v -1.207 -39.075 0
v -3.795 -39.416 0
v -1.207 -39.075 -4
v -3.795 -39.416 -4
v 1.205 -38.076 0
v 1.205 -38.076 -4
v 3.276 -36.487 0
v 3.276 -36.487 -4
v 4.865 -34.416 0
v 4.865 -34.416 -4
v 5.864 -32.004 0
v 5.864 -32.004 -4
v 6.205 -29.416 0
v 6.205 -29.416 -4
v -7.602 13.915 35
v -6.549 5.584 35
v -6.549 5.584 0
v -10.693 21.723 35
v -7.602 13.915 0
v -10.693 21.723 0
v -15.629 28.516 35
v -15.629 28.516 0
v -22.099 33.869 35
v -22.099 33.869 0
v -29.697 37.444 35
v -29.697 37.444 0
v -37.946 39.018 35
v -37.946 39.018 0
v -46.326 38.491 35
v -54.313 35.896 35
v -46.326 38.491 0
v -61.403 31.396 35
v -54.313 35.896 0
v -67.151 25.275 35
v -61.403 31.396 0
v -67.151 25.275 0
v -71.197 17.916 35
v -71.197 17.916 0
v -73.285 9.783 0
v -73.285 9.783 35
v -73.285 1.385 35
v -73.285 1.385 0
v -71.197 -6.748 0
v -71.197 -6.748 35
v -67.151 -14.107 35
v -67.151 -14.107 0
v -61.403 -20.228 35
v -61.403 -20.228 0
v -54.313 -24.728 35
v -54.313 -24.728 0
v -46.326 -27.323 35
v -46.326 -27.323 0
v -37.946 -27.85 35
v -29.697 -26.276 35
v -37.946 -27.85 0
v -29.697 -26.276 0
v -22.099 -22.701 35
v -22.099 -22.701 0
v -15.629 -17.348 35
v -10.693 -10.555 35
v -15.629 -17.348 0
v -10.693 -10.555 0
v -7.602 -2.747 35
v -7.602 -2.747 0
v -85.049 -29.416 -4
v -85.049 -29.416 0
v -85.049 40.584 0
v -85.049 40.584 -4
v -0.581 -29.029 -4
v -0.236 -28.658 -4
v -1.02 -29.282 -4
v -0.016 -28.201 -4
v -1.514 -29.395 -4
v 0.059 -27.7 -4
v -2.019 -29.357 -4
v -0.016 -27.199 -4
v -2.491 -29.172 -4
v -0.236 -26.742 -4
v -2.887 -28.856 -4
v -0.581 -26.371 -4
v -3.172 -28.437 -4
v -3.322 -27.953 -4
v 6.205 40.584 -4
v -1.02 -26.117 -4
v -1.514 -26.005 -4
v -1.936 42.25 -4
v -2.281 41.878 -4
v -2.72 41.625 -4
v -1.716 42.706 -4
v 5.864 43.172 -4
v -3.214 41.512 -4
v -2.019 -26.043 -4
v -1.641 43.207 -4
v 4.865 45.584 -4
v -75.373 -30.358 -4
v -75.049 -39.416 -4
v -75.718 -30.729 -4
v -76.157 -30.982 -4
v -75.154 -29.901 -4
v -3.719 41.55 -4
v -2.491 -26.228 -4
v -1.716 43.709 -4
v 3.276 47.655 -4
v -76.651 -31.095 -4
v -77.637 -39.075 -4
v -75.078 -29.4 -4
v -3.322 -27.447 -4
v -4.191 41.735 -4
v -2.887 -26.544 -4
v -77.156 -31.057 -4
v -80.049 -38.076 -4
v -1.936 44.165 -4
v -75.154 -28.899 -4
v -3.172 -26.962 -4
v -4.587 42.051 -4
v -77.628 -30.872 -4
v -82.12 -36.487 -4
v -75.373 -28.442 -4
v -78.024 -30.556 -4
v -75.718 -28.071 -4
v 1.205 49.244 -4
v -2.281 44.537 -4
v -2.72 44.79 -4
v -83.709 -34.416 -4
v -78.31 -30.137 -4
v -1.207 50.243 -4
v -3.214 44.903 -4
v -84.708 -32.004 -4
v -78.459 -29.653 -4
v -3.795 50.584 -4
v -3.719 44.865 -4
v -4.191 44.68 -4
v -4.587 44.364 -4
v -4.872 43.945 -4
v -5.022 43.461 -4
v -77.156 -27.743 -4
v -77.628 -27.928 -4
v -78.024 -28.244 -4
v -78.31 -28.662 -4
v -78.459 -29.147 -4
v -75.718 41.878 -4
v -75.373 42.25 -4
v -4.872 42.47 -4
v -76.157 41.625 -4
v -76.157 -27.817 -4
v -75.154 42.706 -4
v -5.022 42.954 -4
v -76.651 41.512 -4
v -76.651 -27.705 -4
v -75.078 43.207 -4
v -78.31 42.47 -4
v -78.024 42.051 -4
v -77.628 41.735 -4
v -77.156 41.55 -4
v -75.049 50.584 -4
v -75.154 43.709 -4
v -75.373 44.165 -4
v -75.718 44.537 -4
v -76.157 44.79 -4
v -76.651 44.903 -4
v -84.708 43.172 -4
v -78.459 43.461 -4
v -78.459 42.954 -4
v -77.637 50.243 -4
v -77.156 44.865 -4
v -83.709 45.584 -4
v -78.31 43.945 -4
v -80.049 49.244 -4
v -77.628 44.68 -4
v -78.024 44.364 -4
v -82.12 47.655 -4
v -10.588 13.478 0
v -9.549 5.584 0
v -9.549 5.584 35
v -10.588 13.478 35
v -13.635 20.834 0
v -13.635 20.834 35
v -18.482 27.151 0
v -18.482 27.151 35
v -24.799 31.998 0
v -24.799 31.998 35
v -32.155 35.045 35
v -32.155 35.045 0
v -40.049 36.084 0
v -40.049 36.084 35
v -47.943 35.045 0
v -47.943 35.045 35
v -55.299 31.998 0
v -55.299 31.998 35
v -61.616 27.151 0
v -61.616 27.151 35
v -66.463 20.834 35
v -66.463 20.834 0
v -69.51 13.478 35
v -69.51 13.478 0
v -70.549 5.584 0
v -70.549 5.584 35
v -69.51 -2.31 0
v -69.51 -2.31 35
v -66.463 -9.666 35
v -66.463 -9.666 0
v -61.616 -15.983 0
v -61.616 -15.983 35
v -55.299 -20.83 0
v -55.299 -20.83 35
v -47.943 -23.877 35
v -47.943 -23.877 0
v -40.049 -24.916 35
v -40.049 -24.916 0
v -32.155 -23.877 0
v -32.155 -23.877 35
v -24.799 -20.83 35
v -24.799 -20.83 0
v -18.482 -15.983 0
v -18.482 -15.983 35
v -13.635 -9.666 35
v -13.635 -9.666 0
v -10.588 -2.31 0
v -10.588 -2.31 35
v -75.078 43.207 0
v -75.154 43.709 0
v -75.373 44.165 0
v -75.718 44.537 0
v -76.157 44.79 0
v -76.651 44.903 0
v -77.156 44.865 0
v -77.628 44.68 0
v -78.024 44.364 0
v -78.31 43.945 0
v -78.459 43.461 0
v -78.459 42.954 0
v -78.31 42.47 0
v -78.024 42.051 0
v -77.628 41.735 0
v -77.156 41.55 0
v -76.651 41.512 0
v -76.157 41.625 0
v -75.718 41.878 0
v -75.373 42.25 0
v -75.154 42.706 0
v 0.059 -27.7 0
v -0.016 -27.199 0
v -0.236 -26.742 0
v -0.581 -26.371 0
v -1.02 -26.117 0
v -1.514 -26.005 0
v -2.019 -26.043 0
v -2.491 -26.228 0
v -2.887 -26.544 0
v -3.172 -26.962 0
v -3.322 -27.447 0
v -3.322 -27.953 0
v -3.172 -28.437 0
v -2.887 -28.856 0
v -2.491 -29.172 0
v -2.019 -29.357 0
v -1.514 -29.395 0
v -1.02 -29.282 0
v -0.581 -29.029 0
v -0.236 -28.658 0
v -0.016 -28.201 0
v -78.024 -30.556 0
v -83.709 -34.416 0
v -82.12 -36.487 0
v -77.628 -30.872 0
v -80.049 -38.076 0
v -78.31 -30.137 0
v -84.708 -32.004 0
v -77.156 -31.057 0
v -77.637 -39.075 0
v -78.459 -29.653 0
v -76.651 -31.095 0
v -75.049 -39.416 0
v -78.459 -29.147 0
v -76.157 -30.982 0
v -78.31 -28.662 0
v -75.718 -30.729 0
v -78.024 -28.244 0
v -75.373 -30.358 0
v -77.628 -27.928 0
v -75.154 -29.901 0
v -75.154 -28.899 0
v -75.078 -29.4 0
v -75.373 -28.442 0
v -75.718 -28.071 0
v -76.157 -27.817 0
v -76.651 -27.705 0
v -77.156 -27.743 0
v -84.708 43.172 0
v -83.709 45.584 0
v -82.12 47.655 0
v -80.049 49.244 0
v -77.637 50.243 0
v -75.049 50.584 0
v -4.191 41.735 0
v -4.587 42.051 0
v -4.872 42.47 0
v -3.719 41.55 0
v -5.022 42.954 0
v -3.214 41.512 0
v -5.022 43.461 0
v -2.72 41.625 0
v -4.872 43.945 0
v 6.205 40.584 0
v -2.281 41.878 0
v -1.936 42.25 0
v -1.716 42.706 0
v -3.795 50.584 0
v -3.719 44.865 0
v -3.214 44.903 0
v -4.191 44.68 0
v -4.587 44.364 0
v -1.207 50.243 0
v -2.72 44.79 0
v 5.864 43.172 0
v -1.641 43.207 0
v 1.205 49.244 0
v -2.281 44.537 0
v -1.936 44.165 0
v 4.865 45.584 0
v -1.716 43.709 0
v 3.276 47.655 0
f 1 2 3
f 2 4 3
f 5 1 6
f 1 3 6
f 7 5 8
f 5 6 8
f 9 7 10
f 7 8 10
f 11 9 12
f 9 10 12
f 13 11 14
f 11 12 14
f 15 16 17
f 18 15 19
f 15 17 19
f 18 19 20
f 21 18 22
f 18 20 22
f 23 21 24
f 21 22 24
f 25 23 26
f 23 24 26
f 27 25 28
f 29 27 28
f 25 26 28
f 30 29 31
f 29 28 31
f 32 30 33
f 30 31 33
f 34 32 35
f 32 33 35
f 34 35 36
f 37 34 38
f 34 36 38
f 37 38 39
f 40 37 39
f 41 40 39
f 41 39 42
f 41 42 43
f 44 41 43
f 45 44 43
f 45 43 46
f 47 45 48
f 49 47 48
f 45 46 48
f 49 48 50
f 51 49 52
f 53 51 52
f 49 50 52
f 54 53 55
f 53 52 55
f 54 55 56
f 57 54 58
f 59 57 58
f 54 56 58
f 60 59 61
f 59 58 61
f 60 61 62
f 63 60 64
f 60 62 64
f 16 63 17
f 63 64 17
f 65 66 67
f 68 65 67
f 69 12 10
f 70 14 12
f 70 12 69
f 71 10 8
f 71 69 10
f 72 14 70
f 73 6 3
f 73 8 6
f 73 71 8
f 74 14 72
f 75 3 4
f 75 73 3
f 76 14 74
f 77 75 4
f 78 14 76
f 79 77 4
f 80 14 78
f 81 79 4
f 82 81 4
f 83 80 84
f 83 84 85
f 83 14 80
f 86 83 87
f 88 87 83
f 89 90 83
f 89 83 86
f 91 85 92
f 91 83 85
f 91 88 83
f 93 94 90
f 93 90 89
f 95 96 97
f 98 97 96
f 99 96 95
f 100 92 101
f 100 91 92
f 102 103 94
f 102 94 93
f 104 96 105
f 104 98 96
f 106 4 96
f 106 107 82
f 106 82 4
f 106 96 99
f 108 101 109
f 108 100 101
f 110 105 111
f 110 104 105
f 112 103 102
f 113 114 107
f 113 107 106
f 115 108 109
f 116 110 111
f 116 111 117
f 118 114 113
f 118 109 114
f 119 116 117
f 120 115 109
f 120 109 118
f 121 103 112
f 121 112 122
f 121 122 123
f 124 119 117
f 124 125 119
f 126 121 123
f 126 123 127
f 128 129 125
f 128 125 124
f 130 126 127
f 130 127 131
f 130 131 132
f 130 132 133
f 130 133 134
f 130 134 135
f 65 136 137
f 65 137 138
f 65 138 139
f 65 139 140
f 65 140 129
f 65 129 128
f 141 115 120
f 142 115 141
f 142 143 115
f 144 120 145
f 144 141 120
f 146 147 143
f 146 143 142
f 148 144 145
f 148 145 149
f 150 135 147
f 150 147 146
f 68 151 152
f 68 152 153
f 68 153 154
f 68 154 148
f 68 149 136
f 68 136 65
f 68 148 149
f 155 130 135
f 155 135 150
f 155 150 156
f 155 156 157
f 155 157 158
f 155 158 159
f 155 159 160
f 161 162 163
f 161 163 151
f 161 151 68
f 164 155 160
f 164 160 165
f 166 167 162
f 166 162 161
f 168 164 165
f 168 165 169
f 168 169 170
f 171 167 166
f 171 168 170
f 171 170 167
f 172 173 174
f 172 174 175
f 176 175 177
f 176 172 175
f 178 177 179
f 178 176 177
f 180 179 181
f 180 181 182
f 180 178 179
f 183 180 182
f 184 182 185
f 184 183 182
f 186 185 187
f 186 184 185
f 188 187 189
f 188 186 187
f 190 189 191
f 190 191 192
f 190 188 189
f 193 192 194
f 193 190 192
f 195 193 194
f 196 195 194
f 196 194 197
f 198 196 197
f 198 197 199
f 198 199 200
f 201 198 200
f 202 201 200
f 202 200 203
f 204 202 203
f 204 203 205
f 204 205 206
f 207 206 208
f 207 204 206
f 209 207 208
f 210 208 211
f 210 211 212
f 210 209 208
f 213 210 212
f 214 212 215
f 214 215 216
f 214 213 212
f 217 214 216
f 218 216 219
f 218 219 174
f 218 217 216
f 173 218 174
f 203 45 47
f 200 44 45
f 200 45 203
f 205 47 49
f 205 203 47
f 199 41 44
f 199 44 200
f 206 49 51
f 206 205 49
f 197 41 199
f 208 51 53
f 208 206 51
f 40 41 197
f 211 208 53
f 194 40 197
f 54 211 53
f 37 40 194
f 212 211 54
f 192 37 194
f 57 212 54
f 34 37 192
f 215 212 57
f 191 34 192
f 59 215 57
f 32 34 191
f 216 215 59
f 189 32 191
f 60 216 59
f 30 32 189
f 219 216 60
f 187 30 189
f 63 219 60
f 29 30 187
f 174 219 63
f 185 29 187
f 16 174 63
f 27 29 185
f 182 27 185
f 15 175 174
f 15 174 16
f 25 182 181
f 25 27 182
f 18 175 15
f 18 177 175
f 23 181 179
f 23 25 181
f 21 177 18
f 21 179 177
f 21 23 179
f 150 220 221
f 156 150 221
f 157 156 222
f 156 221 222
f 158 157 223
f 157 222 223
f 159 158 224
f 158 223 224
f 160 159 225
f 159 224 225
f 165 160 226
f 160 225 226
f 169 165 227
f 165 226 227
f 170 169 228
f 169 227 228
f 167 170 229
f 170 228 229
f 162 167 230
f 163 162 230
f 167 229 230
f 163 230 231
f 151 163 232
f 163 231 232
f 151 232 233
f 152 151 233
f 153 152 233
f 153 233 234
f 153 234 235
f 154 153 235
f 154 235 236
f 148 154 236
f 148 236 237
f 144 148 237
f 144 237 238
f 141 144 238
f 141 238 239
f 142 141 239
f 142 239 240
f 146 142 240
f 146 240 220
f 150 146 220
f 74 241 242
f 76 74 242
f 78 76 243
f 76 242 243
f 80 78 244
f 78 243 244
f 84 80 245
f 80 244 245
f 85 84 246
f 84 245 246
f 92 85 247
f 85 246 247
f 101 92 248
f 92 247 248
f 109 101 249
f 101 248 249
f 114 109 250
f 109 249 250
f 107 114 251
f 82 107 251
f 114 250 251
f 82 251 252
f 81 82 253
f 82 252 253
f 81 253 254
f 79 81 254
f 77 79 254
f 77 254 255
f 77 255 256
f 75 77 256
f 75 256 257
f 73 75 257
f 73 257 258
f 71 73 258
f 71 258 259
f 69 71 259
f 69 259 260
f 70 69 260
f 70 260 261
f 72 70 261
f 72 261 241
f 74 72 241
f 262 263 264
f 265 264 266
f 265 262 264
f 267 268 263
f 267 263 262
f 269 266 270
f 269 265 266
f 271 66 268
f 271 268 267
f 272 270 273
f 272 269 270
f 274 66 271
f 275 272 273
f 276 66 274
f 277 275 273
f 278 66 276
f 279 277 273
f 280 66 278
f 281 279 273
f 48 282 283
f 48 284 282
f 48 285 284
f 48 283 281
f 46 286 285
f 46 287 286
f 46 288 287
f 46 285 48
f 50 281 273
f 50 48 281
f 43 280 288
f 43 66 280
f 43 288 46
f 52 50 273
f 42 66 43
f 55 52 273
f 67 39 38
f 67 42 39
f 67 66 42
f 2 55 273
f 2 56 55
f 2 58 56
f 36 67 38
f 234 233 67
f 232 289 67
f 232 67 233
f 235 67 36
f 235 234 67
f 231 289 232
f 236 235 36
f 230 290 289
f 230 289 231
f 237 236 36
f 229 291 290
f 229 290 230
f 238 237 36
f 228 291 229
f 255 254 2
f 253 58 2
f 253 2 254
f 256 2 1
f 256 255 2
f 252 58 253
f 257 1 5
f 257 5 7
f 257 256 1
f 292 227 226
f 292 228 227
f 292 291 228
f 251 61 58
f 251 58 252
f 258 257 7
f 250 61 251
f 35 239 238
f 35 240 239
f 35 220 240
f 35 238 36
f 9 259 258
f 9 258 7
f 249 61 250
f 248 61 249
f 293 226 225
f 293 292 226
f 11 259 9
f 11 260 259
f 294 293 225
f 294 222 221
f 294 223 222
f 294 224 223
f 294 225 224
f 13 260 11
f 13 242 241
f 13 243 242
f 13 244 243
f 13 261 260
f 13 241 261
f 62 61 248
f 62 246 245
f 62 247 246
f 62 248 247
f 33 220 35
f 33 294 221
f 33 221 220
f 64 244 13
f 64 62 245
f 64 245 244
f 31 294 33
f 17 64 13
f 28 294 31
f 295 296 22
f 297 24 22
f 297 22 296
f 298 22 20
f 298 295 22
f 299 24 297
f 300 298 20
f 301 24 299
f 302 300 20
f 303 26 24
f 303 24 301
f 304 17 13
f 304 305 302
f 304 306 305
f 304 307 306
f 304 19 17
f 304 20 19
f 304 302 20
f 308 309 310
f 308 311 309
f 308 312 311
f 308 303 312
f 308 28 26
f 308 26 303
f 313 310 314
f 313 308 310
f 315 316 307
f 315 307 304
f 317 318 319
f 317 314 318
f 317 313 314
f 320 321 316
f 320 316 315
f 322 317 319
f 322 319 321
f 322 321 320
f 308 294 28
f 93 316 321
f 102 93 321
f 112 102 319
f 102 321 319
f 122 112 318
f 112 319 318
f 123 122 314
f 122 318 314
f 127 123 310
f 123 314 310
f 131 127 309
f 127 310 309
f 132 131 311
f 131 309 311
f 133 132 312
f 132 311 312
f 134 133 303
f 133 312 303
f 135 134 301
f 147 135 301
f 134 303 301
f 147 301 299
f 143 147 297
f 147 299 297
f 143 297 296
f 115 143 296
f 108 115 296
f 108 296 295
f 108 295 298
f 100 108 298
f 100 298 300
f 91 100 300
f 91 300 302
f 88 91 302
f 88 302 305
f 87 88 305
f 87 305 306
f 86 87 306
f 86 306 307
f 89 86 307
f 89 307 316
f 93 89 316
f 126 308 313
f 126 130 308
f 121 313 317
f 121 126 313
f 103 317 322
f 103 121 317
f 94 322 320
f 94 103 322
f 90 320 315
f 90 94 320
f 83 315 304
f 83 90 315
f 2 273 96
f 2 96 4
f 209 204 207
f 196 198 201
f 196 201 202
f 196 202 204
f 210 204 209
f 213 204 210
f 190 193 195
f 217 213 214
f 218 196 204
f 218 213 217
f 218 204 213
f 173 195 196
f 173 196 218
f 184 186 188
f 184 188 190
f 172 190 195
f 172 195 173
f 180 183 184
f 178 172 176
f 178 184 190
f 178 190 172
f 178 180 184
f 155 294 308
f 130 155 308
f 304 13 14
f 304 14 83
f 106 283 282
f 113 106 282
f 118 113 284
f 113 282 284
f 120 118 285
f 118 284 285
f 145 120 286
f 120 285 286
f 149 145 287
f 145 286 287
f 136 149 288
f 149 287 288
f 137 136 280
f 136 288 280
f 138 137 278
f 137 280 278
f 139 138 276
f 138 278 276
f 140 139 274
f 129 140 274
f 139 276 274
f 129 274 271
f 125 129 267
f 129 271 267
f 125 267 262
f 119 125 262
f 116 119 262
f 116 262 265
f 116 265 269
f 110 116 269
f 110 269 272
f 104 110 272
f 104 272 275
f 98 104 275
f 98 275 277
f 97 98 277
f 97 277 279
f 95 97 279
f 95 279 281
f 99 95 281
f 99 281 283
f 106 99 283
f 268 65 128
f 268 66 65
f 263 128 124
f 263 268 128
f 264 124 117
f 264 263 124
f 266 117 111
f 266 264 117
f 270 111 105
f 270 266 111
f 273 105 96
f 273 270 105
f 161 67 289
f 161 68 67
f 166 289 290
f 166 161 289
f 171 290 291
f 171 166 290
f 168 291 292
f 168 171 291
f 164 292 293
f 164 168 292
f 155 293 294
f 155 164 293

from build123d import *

# Parameters (mm, degrees)
SKETCH1_W           = 170
SKETCH1_H           = 90
BOSS_EXTRUDE1_DEPTH = 5
SKETCH1_3_W         = 170
SKETCH1_3_H         = 90
SKETCH1_3_R         = 3
BOSS_EXTRUDE2_DEPTH = 10
SKETCH1_4_R         = 33.5
SKETCH1_4_R_2       = 30.5
BOSS_EXTRUDE3_DEPTH = 35
SKETCH1_7_R         = 33.5
BOSS_EXTRUDE4_DEPTH = 10
SKETCH3_W           = 78.746322612
SKETCH3_H           = 90
CUT_EXTRUDE3_DEPTH  = 10
SKETCH5_R           = 1.7
CUT_EXTRUDE4_DEPTH  = 10
SKETCH6_W           = 91.253677388
SKETCH6_H           = 90
CUT_EXTRUDE5_DEPTH  = 6
FILLET2_R           = 10


with BuildPart() as part:
    # Sketch1 → Boss-Extrude1 (new body)
    with BuildSketch(Plane.XY):
        with Locations((-0.049117786, 5.583941606)):
            Rectangle(SKETCH1_W, SKETCH1_H)
    extrude(amount=-BOSS_EXTRUDE1_DEPTH)

    # Sketch1<3> → Boss-Extrude2 (add)
    with BuildSketch(Plane.XY):
        with Locations((-0.049117786, 5.583941606)):
            Rectangle(SKETCH1_3_W, SKETCH1_3_H)
        with Locations((-77.306081152, -32.231283052)):
            Circle(SKETCH1_3_R, mode=Mode.SUBTRACT)
        with Locations((75.391495508, -30.531283052)):
            Circle(SKETCH1_3_R, mode=Mode.SUBTRACT)
        with Locations((75.391495508, 41.466476411)):
            Circle(SKETCH1_3_R, mode=Mode.SUBTRACT)
        with Locations((-77.306081152, 42.827274758)):
            Circle(SKETCH1_3_R, mode=Mode.SUBTRACT)
        with BuildLine():
            Line((-65.684201055, -34.416058394), (65.585965482, -34.416058394))
            ThreePointArc((65.585965482, -34.416058394), (70.80874659, -25.27392277), (79.950882214, -20.051141663))
            Line((79.950882214, -20.051141663), (79.950882214, 31.219024875))
            ThreePointArc((79.950882214, 31.219024875), (70.80874659, 36.441805982), (65.585965482, 45.583941606))
            Line((65.585965482, 45.583941606), (-65.684201055, 45.583941606))
            ThreePointArc((-65.684201055, 45.583941606), (-70.906982163, 36.441805982), (-80.049117786, 31.219024875))
            Line((-80.049117786, 31.219024875), (-80.049117786, -20.051141663))
            ThreePointArc((-80.049117786, -20.051141663), (-70.906982163, -25.27392277), (-65.684201055, -34.416058394))
        make_face(mode=Mode.SUBTRACT)
    extrude(amount=-BOSS_EXTRUDE2_DEPTH)

    # Sketch1<4> → Boss-Extrude3 (add)
    with BuildSketch(Plane.XY):
        with Locations((-40.049117786, 5.583941606)):
            Circle(SKETCH1_4_R)
        with Locations((-40.049117786, 5.583941606)):
            Circle(SKETCH1_4_R_2, mode=Mode.SUBTRACT)
    extrude(amount=BOSS_EXTRUDE3_DEPTH)

    # Sketch1<7> → Boss-Extrude4 (add)
    with BuildSketch(Plane.XY):
        with BuildLine():
            ThreePointArc((-65.684201055, -34.416058394), (-70.906982163, -25.27392277), (-80.049117786, -20.051141663))
            Line((-80.049117786, -20.051141663), (-80.049117786, 31.219024875))
            ThreePointArc((-80.049117786, 31.219024875), (-70.906982163, 36.441805982), (-65.684201055, 45.583941606))
            Line((-65.684201055, 45.583941606), (65.585965482, 45.583941606))
            ThreePointArc((65.585965482, 45.583941606), (70.80874659, 36.441805982), (79.950882214, 31.219024875))
            Line((79.950882214, 31.219024875), (79.950882214, -20.051141663))
            ThreePointArc((79.950882214, -20.051141663), (70.80874659, -25.27392277), (65.585965482, -34.416058394))
            Line((65.585965482, -34.416058394), (-65.684201055, -34.416058394))
        make_face()
        with Locations((-40.049117786, 5.583941606)):
            Circle(SKETCH1_7_R, mode=Mode.SUBTRACT)
    extrude(amount=-BOSS_EXTRUDE4_DEPTH)

    # Sketch3 → Cut-Extrude3 (cut)
    with BuildSketch(Plane.XY):
        with Locations((45.577720908, 5.583941606)):
            Rectangle(SKETCH3_W, SKETCH3_H)
    extrude(amount=-CUT_EXTRUDE3_DEPTH, mode=Mode.SUBTRACT)

    # Sketch5 → Cut-Extrude4 (cut)
    with BuildSketch(Plane.XY):
        with Locations((-76.777993439, 43.20743885)):
            Circle(SKETCH5_R)
        with Locations((-3.340612715, 43.20743885)):
            Circle(SKETCH5_R)
        with Locations((-76.777993439, -29.399888528)):
            Circle(SKETCH5_R)
        with Locations((-1.640612715, -27.699888528)):
            Circle(SKETCH5_R)
    extrude(amount=-CUT_EXTRUDE4_DEPTH, mode=Mode.SUBTRACT)

    # Sketch6 → Cut-Extrude5 (cut)
    with BuildSketch(Plane(origin=(0, 0, -10), x_dir=(-1, 0, 0), z_dir=(0, 0, -1))):
        with Locations((39.422279092, 5.583941606)):
            Rectangle(SKETCH6_W, SKETCH6_H)
    extrude(amount=-CUT_EXTRUDE5_DEPTH, mode=Mode.SUBTRACT)

    # Fillet2
    fillet2_edges = [part.edges().sort_by_distance(p)[0] for p in [
        (6.204559602, -39.416058394, -2),
        (6.204559602, 50.583941606, -2),
        (-85.049117786, -39.416058394, -2),
        (-85.049117786, 50.583941606, -2),
    ]]
    fillet(fillet2_edges, radius=FILLET2_R)


solid = part.part
